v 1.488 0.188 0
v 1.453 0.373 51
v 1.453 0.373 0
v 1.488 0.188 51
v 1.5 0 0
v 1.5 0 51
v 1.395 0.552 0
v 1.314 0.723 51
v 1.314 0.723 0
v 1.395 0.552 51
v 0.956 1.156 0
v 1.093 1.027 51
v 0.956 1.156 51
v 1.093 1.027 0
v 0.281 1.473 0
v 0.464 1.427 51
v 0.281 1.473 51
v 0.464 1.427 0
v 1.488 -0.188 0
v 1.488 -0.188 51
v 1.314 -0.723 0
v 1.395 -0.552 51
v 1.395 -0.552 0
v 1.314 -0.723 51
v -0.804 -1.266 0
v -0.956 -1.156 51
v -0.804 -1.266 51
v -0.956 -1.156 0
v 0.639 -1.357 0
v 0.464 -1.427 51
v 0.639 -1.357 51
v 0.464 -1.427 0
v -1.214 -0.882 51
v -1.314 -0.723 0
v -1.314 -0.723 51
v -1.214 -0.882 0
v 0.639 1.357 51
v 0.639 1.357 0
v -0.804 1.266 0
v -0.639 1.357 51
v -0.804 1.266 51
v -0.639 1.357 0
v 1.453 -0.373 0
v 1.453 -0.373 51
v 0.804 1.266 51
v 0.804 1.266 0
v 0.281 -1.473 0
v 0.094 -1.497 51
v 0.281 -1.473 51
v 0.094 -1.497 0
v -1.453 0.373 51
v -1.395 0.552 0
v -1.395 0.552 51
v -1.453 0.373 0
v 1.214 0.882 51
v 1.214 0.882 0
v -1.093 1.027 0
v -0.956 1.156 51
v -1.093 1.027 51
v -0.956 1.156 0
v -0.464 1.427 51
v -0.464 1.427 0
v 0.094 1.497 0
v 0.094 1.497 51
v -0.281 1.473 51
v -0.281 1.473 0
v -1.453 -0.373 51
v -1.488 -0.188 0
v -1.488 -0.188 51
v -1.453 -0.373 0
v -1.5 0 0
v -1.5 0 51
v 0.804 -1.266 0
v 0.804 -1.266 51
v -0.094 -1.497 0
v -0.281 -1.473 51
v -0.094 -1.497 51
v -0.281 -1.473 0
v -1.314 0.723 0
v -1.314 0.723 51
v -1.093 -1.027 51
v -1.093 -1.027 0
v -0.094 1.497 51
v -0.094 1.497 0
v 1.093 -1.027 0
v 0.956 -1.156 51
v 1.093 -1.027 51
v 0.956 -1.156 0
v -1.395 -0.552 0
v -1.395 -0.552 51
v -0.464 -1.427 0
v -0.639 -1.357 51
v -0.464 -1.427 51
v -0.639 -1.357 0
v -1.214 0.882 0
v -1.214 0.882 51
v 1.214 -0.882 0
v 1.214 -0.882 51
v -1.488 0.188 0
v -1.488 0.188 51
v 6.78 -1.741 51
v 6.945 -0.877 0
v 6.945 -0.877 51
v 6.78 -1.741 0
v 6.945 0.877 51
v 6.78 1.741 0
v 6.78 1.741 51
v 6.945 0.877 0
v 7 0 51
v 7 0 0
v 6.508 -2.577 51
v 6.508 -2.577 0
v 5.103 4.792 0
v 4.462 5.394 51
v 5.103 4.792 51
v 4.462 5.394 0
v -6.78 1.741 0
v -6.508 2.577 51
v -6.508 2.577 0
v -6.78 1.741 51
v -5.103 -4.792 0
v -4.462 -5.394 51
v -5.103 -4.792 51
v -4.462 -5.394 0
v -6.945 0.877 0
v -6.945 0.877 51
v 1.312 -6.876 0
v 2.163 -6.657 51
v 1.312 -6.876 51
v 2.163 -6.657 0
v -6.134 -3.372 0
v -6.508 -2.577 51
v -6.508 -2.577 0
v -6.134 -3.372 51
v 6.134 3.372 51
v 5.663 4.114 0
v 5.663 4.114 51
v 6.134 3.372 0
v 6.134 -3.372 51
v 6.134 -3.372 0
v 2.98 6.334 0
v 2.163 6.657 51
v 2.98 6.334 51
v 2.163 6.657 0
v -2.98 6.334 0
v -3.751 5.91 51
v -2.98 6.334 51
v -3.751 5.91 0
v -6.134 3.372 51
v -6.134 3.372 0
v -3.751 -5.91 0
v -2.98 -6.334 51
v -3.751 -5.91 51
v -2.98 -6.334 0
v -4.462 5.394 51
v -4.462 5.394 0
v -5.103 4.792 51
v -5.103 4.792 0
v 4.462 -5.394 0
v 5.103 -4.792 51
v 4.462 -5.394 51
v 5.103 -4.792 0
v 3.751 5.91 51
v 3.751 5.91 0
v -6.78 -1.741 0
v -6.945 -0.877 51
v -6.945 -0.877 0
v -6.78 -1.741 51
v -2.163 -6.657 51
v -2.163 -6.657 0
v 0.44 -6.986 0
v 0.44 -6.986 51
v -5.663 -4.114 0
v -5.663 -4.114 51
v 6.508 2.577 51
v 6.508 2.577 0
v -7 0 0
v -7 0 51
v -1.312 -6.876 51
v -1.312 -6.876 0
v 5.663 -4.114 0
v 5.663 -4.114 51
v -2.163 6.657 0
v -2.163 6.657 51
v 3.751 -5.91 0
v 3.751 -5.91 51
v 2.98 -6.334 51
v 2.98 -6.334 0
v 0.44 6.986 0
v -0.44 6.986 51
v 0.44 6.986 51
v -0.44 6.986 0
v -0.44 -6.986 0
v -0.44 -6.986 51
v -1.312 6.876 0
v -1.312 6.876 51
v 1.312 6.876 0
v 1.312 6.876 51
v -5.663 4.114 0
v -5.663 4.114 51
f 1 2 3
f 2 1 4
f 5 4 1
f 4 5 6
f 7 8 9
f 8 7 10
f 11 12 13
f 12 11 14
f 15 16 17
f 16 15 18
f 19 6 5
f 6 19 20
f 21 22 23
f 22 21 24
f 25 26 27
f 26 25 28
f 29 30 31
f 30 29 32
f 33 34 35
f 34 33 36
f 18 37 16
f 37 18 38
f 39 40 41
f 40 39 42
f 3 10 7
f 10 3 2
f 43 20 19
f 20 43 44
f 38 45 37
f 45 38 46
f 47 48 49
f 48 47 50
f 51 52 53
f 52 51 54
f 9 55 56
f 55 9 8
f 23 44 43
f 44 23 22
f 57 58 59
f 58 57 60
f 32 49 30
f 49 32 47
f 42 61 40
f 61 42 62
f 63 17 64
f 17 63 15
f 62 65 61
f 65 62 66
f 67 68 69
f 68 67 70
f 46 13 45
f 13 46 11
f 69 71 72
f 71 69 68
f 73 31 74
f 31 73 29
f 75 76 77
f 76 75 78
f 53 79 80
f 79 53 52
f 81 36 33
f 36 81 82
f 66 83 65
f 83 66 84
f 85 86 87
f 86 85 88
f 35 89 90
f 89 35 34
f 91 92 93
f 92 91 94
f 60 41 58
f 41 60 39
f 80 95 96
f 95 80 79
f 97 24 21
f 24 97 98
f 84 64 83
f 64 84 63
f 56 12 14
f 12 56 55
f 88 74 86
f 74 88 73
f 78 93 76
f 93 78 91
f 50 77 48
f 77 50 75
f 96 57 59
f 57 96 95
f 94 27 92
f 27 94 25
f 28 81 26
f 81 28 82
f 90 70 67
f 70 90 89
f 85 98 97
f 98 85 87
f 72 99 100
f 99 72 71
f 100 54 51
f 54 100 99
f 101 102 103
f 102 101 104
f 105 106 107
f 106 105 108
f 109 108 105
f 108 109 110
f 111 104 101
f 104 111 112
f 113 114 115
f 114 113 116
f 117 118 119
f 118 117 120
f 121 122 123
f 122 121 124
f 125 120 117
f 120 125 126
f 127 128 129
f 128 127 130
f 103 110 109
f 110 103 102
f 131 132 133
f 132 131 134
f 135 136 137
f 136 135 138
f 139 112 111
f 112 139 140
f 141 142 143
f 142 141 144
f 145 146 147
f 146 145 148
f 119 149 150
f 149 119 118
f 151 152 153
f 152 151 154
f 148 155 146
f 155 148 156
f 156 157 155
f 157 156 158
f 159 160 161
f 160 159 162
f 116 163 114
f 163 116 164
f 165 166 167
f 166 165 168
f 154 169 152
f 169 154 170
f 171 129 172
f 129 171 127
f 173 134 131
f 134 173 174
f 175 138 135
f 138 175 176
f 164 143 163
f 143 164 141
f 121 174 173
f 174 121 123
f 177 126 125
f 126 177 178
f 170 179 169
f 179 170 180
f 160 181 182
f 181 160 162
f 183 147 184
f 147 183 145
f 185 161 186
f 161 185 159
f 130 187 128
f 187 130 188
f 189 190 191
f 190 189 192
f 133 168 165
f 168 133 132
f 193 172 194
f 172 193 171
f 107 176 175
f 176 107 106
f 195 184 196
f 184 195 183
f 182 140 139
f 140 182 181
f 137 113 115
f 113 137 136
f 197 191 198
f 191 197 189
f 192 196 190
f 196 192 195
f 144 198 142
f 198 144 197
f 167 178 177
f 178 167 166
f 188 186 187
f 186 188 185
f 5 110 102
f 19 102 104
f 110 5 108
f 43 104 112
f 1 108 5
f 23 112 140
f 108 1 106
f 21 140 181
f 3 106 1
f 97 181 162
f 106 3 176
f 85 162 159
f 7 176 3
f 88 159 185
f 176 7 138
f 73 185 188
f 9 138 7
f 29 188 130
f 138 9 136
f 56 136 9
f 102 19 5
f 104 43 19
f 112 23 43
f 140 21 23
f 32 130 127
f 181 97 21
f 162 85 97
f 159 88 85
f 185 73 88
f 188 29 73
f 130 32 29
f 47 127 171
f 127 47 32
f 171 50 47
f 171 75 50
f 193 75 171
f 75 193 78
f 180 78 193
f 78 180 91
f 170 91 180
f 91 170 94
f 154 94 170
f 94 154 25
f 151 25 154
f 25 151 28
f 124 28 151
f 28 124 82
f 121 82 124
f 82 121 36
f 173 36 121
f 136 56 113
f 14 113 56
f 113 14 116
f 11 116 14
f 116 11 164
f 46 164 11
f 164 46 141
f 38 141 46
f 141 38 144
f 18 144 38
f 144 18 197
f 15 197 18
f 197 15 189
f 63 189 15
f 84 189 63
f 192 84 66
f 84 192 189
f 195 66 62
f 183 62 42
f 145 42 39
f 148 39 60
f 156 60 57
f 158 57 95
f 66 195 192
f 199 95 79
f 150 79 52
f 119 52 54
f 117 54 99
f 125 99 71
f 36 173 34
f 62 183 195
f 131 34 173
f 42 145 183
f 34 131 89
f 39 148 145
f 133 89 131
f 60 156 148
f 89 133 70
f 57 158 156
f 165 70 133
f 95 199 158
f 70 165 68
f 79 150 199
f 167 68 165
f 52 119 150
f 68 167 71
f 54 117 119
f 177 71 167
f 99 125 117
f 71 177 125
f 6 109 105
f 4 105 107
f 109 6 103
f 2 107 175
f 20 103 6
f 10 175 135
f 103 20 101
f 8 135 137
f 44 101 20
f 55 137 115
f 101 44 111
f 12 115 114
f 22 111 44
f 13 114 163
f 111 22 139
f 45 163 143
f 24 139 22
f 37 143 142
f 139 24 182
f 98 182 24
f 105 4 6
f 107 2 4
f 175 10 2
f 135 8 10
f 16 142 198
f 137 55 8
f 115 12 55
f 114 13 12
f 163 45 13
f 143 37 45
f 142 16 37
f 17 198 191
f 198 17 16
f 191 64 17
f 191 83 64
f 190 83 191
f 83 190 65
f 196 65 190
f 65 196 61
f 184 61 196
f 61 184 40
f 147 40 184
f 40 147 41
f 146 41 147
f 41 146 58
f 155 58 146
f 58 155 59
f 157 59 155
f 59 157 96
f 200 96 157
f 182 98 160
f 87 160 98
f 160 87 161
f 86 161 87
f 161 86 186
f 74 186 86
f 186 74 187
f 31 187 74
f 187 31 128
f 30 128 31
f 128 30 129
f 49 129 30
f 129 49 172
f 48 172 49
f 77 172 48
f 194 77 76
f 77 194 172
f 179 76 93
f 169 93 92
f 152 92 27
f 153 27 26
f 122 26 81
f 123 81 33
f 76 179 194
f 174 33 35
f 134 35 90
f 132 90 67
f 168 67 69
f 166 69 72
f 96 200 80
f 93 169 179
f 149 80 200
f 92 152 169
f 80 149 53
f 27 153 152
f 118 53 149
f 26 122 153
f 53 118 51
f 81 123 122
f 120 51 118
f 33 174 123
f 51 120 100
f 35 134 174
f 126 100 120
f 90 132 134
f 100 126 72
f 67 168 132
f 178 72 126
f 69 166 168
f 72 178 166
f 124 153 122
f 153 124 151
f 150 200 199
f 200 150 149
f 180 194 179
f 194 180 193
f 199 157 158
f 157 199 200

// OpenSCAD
$fn = 50;


difference() {
	union() {
		cylinder(h = 51, r = 7.0000000000);
	}
	union() {
		translate(v = [0, 0, -100]) {
			cylinder(h = 200, r = 1.5000000000);
		}
		translate(v = [0, 0, -100]) {
			cylinder(h = 200, r = 1.5000000000);
		}
	}
}
